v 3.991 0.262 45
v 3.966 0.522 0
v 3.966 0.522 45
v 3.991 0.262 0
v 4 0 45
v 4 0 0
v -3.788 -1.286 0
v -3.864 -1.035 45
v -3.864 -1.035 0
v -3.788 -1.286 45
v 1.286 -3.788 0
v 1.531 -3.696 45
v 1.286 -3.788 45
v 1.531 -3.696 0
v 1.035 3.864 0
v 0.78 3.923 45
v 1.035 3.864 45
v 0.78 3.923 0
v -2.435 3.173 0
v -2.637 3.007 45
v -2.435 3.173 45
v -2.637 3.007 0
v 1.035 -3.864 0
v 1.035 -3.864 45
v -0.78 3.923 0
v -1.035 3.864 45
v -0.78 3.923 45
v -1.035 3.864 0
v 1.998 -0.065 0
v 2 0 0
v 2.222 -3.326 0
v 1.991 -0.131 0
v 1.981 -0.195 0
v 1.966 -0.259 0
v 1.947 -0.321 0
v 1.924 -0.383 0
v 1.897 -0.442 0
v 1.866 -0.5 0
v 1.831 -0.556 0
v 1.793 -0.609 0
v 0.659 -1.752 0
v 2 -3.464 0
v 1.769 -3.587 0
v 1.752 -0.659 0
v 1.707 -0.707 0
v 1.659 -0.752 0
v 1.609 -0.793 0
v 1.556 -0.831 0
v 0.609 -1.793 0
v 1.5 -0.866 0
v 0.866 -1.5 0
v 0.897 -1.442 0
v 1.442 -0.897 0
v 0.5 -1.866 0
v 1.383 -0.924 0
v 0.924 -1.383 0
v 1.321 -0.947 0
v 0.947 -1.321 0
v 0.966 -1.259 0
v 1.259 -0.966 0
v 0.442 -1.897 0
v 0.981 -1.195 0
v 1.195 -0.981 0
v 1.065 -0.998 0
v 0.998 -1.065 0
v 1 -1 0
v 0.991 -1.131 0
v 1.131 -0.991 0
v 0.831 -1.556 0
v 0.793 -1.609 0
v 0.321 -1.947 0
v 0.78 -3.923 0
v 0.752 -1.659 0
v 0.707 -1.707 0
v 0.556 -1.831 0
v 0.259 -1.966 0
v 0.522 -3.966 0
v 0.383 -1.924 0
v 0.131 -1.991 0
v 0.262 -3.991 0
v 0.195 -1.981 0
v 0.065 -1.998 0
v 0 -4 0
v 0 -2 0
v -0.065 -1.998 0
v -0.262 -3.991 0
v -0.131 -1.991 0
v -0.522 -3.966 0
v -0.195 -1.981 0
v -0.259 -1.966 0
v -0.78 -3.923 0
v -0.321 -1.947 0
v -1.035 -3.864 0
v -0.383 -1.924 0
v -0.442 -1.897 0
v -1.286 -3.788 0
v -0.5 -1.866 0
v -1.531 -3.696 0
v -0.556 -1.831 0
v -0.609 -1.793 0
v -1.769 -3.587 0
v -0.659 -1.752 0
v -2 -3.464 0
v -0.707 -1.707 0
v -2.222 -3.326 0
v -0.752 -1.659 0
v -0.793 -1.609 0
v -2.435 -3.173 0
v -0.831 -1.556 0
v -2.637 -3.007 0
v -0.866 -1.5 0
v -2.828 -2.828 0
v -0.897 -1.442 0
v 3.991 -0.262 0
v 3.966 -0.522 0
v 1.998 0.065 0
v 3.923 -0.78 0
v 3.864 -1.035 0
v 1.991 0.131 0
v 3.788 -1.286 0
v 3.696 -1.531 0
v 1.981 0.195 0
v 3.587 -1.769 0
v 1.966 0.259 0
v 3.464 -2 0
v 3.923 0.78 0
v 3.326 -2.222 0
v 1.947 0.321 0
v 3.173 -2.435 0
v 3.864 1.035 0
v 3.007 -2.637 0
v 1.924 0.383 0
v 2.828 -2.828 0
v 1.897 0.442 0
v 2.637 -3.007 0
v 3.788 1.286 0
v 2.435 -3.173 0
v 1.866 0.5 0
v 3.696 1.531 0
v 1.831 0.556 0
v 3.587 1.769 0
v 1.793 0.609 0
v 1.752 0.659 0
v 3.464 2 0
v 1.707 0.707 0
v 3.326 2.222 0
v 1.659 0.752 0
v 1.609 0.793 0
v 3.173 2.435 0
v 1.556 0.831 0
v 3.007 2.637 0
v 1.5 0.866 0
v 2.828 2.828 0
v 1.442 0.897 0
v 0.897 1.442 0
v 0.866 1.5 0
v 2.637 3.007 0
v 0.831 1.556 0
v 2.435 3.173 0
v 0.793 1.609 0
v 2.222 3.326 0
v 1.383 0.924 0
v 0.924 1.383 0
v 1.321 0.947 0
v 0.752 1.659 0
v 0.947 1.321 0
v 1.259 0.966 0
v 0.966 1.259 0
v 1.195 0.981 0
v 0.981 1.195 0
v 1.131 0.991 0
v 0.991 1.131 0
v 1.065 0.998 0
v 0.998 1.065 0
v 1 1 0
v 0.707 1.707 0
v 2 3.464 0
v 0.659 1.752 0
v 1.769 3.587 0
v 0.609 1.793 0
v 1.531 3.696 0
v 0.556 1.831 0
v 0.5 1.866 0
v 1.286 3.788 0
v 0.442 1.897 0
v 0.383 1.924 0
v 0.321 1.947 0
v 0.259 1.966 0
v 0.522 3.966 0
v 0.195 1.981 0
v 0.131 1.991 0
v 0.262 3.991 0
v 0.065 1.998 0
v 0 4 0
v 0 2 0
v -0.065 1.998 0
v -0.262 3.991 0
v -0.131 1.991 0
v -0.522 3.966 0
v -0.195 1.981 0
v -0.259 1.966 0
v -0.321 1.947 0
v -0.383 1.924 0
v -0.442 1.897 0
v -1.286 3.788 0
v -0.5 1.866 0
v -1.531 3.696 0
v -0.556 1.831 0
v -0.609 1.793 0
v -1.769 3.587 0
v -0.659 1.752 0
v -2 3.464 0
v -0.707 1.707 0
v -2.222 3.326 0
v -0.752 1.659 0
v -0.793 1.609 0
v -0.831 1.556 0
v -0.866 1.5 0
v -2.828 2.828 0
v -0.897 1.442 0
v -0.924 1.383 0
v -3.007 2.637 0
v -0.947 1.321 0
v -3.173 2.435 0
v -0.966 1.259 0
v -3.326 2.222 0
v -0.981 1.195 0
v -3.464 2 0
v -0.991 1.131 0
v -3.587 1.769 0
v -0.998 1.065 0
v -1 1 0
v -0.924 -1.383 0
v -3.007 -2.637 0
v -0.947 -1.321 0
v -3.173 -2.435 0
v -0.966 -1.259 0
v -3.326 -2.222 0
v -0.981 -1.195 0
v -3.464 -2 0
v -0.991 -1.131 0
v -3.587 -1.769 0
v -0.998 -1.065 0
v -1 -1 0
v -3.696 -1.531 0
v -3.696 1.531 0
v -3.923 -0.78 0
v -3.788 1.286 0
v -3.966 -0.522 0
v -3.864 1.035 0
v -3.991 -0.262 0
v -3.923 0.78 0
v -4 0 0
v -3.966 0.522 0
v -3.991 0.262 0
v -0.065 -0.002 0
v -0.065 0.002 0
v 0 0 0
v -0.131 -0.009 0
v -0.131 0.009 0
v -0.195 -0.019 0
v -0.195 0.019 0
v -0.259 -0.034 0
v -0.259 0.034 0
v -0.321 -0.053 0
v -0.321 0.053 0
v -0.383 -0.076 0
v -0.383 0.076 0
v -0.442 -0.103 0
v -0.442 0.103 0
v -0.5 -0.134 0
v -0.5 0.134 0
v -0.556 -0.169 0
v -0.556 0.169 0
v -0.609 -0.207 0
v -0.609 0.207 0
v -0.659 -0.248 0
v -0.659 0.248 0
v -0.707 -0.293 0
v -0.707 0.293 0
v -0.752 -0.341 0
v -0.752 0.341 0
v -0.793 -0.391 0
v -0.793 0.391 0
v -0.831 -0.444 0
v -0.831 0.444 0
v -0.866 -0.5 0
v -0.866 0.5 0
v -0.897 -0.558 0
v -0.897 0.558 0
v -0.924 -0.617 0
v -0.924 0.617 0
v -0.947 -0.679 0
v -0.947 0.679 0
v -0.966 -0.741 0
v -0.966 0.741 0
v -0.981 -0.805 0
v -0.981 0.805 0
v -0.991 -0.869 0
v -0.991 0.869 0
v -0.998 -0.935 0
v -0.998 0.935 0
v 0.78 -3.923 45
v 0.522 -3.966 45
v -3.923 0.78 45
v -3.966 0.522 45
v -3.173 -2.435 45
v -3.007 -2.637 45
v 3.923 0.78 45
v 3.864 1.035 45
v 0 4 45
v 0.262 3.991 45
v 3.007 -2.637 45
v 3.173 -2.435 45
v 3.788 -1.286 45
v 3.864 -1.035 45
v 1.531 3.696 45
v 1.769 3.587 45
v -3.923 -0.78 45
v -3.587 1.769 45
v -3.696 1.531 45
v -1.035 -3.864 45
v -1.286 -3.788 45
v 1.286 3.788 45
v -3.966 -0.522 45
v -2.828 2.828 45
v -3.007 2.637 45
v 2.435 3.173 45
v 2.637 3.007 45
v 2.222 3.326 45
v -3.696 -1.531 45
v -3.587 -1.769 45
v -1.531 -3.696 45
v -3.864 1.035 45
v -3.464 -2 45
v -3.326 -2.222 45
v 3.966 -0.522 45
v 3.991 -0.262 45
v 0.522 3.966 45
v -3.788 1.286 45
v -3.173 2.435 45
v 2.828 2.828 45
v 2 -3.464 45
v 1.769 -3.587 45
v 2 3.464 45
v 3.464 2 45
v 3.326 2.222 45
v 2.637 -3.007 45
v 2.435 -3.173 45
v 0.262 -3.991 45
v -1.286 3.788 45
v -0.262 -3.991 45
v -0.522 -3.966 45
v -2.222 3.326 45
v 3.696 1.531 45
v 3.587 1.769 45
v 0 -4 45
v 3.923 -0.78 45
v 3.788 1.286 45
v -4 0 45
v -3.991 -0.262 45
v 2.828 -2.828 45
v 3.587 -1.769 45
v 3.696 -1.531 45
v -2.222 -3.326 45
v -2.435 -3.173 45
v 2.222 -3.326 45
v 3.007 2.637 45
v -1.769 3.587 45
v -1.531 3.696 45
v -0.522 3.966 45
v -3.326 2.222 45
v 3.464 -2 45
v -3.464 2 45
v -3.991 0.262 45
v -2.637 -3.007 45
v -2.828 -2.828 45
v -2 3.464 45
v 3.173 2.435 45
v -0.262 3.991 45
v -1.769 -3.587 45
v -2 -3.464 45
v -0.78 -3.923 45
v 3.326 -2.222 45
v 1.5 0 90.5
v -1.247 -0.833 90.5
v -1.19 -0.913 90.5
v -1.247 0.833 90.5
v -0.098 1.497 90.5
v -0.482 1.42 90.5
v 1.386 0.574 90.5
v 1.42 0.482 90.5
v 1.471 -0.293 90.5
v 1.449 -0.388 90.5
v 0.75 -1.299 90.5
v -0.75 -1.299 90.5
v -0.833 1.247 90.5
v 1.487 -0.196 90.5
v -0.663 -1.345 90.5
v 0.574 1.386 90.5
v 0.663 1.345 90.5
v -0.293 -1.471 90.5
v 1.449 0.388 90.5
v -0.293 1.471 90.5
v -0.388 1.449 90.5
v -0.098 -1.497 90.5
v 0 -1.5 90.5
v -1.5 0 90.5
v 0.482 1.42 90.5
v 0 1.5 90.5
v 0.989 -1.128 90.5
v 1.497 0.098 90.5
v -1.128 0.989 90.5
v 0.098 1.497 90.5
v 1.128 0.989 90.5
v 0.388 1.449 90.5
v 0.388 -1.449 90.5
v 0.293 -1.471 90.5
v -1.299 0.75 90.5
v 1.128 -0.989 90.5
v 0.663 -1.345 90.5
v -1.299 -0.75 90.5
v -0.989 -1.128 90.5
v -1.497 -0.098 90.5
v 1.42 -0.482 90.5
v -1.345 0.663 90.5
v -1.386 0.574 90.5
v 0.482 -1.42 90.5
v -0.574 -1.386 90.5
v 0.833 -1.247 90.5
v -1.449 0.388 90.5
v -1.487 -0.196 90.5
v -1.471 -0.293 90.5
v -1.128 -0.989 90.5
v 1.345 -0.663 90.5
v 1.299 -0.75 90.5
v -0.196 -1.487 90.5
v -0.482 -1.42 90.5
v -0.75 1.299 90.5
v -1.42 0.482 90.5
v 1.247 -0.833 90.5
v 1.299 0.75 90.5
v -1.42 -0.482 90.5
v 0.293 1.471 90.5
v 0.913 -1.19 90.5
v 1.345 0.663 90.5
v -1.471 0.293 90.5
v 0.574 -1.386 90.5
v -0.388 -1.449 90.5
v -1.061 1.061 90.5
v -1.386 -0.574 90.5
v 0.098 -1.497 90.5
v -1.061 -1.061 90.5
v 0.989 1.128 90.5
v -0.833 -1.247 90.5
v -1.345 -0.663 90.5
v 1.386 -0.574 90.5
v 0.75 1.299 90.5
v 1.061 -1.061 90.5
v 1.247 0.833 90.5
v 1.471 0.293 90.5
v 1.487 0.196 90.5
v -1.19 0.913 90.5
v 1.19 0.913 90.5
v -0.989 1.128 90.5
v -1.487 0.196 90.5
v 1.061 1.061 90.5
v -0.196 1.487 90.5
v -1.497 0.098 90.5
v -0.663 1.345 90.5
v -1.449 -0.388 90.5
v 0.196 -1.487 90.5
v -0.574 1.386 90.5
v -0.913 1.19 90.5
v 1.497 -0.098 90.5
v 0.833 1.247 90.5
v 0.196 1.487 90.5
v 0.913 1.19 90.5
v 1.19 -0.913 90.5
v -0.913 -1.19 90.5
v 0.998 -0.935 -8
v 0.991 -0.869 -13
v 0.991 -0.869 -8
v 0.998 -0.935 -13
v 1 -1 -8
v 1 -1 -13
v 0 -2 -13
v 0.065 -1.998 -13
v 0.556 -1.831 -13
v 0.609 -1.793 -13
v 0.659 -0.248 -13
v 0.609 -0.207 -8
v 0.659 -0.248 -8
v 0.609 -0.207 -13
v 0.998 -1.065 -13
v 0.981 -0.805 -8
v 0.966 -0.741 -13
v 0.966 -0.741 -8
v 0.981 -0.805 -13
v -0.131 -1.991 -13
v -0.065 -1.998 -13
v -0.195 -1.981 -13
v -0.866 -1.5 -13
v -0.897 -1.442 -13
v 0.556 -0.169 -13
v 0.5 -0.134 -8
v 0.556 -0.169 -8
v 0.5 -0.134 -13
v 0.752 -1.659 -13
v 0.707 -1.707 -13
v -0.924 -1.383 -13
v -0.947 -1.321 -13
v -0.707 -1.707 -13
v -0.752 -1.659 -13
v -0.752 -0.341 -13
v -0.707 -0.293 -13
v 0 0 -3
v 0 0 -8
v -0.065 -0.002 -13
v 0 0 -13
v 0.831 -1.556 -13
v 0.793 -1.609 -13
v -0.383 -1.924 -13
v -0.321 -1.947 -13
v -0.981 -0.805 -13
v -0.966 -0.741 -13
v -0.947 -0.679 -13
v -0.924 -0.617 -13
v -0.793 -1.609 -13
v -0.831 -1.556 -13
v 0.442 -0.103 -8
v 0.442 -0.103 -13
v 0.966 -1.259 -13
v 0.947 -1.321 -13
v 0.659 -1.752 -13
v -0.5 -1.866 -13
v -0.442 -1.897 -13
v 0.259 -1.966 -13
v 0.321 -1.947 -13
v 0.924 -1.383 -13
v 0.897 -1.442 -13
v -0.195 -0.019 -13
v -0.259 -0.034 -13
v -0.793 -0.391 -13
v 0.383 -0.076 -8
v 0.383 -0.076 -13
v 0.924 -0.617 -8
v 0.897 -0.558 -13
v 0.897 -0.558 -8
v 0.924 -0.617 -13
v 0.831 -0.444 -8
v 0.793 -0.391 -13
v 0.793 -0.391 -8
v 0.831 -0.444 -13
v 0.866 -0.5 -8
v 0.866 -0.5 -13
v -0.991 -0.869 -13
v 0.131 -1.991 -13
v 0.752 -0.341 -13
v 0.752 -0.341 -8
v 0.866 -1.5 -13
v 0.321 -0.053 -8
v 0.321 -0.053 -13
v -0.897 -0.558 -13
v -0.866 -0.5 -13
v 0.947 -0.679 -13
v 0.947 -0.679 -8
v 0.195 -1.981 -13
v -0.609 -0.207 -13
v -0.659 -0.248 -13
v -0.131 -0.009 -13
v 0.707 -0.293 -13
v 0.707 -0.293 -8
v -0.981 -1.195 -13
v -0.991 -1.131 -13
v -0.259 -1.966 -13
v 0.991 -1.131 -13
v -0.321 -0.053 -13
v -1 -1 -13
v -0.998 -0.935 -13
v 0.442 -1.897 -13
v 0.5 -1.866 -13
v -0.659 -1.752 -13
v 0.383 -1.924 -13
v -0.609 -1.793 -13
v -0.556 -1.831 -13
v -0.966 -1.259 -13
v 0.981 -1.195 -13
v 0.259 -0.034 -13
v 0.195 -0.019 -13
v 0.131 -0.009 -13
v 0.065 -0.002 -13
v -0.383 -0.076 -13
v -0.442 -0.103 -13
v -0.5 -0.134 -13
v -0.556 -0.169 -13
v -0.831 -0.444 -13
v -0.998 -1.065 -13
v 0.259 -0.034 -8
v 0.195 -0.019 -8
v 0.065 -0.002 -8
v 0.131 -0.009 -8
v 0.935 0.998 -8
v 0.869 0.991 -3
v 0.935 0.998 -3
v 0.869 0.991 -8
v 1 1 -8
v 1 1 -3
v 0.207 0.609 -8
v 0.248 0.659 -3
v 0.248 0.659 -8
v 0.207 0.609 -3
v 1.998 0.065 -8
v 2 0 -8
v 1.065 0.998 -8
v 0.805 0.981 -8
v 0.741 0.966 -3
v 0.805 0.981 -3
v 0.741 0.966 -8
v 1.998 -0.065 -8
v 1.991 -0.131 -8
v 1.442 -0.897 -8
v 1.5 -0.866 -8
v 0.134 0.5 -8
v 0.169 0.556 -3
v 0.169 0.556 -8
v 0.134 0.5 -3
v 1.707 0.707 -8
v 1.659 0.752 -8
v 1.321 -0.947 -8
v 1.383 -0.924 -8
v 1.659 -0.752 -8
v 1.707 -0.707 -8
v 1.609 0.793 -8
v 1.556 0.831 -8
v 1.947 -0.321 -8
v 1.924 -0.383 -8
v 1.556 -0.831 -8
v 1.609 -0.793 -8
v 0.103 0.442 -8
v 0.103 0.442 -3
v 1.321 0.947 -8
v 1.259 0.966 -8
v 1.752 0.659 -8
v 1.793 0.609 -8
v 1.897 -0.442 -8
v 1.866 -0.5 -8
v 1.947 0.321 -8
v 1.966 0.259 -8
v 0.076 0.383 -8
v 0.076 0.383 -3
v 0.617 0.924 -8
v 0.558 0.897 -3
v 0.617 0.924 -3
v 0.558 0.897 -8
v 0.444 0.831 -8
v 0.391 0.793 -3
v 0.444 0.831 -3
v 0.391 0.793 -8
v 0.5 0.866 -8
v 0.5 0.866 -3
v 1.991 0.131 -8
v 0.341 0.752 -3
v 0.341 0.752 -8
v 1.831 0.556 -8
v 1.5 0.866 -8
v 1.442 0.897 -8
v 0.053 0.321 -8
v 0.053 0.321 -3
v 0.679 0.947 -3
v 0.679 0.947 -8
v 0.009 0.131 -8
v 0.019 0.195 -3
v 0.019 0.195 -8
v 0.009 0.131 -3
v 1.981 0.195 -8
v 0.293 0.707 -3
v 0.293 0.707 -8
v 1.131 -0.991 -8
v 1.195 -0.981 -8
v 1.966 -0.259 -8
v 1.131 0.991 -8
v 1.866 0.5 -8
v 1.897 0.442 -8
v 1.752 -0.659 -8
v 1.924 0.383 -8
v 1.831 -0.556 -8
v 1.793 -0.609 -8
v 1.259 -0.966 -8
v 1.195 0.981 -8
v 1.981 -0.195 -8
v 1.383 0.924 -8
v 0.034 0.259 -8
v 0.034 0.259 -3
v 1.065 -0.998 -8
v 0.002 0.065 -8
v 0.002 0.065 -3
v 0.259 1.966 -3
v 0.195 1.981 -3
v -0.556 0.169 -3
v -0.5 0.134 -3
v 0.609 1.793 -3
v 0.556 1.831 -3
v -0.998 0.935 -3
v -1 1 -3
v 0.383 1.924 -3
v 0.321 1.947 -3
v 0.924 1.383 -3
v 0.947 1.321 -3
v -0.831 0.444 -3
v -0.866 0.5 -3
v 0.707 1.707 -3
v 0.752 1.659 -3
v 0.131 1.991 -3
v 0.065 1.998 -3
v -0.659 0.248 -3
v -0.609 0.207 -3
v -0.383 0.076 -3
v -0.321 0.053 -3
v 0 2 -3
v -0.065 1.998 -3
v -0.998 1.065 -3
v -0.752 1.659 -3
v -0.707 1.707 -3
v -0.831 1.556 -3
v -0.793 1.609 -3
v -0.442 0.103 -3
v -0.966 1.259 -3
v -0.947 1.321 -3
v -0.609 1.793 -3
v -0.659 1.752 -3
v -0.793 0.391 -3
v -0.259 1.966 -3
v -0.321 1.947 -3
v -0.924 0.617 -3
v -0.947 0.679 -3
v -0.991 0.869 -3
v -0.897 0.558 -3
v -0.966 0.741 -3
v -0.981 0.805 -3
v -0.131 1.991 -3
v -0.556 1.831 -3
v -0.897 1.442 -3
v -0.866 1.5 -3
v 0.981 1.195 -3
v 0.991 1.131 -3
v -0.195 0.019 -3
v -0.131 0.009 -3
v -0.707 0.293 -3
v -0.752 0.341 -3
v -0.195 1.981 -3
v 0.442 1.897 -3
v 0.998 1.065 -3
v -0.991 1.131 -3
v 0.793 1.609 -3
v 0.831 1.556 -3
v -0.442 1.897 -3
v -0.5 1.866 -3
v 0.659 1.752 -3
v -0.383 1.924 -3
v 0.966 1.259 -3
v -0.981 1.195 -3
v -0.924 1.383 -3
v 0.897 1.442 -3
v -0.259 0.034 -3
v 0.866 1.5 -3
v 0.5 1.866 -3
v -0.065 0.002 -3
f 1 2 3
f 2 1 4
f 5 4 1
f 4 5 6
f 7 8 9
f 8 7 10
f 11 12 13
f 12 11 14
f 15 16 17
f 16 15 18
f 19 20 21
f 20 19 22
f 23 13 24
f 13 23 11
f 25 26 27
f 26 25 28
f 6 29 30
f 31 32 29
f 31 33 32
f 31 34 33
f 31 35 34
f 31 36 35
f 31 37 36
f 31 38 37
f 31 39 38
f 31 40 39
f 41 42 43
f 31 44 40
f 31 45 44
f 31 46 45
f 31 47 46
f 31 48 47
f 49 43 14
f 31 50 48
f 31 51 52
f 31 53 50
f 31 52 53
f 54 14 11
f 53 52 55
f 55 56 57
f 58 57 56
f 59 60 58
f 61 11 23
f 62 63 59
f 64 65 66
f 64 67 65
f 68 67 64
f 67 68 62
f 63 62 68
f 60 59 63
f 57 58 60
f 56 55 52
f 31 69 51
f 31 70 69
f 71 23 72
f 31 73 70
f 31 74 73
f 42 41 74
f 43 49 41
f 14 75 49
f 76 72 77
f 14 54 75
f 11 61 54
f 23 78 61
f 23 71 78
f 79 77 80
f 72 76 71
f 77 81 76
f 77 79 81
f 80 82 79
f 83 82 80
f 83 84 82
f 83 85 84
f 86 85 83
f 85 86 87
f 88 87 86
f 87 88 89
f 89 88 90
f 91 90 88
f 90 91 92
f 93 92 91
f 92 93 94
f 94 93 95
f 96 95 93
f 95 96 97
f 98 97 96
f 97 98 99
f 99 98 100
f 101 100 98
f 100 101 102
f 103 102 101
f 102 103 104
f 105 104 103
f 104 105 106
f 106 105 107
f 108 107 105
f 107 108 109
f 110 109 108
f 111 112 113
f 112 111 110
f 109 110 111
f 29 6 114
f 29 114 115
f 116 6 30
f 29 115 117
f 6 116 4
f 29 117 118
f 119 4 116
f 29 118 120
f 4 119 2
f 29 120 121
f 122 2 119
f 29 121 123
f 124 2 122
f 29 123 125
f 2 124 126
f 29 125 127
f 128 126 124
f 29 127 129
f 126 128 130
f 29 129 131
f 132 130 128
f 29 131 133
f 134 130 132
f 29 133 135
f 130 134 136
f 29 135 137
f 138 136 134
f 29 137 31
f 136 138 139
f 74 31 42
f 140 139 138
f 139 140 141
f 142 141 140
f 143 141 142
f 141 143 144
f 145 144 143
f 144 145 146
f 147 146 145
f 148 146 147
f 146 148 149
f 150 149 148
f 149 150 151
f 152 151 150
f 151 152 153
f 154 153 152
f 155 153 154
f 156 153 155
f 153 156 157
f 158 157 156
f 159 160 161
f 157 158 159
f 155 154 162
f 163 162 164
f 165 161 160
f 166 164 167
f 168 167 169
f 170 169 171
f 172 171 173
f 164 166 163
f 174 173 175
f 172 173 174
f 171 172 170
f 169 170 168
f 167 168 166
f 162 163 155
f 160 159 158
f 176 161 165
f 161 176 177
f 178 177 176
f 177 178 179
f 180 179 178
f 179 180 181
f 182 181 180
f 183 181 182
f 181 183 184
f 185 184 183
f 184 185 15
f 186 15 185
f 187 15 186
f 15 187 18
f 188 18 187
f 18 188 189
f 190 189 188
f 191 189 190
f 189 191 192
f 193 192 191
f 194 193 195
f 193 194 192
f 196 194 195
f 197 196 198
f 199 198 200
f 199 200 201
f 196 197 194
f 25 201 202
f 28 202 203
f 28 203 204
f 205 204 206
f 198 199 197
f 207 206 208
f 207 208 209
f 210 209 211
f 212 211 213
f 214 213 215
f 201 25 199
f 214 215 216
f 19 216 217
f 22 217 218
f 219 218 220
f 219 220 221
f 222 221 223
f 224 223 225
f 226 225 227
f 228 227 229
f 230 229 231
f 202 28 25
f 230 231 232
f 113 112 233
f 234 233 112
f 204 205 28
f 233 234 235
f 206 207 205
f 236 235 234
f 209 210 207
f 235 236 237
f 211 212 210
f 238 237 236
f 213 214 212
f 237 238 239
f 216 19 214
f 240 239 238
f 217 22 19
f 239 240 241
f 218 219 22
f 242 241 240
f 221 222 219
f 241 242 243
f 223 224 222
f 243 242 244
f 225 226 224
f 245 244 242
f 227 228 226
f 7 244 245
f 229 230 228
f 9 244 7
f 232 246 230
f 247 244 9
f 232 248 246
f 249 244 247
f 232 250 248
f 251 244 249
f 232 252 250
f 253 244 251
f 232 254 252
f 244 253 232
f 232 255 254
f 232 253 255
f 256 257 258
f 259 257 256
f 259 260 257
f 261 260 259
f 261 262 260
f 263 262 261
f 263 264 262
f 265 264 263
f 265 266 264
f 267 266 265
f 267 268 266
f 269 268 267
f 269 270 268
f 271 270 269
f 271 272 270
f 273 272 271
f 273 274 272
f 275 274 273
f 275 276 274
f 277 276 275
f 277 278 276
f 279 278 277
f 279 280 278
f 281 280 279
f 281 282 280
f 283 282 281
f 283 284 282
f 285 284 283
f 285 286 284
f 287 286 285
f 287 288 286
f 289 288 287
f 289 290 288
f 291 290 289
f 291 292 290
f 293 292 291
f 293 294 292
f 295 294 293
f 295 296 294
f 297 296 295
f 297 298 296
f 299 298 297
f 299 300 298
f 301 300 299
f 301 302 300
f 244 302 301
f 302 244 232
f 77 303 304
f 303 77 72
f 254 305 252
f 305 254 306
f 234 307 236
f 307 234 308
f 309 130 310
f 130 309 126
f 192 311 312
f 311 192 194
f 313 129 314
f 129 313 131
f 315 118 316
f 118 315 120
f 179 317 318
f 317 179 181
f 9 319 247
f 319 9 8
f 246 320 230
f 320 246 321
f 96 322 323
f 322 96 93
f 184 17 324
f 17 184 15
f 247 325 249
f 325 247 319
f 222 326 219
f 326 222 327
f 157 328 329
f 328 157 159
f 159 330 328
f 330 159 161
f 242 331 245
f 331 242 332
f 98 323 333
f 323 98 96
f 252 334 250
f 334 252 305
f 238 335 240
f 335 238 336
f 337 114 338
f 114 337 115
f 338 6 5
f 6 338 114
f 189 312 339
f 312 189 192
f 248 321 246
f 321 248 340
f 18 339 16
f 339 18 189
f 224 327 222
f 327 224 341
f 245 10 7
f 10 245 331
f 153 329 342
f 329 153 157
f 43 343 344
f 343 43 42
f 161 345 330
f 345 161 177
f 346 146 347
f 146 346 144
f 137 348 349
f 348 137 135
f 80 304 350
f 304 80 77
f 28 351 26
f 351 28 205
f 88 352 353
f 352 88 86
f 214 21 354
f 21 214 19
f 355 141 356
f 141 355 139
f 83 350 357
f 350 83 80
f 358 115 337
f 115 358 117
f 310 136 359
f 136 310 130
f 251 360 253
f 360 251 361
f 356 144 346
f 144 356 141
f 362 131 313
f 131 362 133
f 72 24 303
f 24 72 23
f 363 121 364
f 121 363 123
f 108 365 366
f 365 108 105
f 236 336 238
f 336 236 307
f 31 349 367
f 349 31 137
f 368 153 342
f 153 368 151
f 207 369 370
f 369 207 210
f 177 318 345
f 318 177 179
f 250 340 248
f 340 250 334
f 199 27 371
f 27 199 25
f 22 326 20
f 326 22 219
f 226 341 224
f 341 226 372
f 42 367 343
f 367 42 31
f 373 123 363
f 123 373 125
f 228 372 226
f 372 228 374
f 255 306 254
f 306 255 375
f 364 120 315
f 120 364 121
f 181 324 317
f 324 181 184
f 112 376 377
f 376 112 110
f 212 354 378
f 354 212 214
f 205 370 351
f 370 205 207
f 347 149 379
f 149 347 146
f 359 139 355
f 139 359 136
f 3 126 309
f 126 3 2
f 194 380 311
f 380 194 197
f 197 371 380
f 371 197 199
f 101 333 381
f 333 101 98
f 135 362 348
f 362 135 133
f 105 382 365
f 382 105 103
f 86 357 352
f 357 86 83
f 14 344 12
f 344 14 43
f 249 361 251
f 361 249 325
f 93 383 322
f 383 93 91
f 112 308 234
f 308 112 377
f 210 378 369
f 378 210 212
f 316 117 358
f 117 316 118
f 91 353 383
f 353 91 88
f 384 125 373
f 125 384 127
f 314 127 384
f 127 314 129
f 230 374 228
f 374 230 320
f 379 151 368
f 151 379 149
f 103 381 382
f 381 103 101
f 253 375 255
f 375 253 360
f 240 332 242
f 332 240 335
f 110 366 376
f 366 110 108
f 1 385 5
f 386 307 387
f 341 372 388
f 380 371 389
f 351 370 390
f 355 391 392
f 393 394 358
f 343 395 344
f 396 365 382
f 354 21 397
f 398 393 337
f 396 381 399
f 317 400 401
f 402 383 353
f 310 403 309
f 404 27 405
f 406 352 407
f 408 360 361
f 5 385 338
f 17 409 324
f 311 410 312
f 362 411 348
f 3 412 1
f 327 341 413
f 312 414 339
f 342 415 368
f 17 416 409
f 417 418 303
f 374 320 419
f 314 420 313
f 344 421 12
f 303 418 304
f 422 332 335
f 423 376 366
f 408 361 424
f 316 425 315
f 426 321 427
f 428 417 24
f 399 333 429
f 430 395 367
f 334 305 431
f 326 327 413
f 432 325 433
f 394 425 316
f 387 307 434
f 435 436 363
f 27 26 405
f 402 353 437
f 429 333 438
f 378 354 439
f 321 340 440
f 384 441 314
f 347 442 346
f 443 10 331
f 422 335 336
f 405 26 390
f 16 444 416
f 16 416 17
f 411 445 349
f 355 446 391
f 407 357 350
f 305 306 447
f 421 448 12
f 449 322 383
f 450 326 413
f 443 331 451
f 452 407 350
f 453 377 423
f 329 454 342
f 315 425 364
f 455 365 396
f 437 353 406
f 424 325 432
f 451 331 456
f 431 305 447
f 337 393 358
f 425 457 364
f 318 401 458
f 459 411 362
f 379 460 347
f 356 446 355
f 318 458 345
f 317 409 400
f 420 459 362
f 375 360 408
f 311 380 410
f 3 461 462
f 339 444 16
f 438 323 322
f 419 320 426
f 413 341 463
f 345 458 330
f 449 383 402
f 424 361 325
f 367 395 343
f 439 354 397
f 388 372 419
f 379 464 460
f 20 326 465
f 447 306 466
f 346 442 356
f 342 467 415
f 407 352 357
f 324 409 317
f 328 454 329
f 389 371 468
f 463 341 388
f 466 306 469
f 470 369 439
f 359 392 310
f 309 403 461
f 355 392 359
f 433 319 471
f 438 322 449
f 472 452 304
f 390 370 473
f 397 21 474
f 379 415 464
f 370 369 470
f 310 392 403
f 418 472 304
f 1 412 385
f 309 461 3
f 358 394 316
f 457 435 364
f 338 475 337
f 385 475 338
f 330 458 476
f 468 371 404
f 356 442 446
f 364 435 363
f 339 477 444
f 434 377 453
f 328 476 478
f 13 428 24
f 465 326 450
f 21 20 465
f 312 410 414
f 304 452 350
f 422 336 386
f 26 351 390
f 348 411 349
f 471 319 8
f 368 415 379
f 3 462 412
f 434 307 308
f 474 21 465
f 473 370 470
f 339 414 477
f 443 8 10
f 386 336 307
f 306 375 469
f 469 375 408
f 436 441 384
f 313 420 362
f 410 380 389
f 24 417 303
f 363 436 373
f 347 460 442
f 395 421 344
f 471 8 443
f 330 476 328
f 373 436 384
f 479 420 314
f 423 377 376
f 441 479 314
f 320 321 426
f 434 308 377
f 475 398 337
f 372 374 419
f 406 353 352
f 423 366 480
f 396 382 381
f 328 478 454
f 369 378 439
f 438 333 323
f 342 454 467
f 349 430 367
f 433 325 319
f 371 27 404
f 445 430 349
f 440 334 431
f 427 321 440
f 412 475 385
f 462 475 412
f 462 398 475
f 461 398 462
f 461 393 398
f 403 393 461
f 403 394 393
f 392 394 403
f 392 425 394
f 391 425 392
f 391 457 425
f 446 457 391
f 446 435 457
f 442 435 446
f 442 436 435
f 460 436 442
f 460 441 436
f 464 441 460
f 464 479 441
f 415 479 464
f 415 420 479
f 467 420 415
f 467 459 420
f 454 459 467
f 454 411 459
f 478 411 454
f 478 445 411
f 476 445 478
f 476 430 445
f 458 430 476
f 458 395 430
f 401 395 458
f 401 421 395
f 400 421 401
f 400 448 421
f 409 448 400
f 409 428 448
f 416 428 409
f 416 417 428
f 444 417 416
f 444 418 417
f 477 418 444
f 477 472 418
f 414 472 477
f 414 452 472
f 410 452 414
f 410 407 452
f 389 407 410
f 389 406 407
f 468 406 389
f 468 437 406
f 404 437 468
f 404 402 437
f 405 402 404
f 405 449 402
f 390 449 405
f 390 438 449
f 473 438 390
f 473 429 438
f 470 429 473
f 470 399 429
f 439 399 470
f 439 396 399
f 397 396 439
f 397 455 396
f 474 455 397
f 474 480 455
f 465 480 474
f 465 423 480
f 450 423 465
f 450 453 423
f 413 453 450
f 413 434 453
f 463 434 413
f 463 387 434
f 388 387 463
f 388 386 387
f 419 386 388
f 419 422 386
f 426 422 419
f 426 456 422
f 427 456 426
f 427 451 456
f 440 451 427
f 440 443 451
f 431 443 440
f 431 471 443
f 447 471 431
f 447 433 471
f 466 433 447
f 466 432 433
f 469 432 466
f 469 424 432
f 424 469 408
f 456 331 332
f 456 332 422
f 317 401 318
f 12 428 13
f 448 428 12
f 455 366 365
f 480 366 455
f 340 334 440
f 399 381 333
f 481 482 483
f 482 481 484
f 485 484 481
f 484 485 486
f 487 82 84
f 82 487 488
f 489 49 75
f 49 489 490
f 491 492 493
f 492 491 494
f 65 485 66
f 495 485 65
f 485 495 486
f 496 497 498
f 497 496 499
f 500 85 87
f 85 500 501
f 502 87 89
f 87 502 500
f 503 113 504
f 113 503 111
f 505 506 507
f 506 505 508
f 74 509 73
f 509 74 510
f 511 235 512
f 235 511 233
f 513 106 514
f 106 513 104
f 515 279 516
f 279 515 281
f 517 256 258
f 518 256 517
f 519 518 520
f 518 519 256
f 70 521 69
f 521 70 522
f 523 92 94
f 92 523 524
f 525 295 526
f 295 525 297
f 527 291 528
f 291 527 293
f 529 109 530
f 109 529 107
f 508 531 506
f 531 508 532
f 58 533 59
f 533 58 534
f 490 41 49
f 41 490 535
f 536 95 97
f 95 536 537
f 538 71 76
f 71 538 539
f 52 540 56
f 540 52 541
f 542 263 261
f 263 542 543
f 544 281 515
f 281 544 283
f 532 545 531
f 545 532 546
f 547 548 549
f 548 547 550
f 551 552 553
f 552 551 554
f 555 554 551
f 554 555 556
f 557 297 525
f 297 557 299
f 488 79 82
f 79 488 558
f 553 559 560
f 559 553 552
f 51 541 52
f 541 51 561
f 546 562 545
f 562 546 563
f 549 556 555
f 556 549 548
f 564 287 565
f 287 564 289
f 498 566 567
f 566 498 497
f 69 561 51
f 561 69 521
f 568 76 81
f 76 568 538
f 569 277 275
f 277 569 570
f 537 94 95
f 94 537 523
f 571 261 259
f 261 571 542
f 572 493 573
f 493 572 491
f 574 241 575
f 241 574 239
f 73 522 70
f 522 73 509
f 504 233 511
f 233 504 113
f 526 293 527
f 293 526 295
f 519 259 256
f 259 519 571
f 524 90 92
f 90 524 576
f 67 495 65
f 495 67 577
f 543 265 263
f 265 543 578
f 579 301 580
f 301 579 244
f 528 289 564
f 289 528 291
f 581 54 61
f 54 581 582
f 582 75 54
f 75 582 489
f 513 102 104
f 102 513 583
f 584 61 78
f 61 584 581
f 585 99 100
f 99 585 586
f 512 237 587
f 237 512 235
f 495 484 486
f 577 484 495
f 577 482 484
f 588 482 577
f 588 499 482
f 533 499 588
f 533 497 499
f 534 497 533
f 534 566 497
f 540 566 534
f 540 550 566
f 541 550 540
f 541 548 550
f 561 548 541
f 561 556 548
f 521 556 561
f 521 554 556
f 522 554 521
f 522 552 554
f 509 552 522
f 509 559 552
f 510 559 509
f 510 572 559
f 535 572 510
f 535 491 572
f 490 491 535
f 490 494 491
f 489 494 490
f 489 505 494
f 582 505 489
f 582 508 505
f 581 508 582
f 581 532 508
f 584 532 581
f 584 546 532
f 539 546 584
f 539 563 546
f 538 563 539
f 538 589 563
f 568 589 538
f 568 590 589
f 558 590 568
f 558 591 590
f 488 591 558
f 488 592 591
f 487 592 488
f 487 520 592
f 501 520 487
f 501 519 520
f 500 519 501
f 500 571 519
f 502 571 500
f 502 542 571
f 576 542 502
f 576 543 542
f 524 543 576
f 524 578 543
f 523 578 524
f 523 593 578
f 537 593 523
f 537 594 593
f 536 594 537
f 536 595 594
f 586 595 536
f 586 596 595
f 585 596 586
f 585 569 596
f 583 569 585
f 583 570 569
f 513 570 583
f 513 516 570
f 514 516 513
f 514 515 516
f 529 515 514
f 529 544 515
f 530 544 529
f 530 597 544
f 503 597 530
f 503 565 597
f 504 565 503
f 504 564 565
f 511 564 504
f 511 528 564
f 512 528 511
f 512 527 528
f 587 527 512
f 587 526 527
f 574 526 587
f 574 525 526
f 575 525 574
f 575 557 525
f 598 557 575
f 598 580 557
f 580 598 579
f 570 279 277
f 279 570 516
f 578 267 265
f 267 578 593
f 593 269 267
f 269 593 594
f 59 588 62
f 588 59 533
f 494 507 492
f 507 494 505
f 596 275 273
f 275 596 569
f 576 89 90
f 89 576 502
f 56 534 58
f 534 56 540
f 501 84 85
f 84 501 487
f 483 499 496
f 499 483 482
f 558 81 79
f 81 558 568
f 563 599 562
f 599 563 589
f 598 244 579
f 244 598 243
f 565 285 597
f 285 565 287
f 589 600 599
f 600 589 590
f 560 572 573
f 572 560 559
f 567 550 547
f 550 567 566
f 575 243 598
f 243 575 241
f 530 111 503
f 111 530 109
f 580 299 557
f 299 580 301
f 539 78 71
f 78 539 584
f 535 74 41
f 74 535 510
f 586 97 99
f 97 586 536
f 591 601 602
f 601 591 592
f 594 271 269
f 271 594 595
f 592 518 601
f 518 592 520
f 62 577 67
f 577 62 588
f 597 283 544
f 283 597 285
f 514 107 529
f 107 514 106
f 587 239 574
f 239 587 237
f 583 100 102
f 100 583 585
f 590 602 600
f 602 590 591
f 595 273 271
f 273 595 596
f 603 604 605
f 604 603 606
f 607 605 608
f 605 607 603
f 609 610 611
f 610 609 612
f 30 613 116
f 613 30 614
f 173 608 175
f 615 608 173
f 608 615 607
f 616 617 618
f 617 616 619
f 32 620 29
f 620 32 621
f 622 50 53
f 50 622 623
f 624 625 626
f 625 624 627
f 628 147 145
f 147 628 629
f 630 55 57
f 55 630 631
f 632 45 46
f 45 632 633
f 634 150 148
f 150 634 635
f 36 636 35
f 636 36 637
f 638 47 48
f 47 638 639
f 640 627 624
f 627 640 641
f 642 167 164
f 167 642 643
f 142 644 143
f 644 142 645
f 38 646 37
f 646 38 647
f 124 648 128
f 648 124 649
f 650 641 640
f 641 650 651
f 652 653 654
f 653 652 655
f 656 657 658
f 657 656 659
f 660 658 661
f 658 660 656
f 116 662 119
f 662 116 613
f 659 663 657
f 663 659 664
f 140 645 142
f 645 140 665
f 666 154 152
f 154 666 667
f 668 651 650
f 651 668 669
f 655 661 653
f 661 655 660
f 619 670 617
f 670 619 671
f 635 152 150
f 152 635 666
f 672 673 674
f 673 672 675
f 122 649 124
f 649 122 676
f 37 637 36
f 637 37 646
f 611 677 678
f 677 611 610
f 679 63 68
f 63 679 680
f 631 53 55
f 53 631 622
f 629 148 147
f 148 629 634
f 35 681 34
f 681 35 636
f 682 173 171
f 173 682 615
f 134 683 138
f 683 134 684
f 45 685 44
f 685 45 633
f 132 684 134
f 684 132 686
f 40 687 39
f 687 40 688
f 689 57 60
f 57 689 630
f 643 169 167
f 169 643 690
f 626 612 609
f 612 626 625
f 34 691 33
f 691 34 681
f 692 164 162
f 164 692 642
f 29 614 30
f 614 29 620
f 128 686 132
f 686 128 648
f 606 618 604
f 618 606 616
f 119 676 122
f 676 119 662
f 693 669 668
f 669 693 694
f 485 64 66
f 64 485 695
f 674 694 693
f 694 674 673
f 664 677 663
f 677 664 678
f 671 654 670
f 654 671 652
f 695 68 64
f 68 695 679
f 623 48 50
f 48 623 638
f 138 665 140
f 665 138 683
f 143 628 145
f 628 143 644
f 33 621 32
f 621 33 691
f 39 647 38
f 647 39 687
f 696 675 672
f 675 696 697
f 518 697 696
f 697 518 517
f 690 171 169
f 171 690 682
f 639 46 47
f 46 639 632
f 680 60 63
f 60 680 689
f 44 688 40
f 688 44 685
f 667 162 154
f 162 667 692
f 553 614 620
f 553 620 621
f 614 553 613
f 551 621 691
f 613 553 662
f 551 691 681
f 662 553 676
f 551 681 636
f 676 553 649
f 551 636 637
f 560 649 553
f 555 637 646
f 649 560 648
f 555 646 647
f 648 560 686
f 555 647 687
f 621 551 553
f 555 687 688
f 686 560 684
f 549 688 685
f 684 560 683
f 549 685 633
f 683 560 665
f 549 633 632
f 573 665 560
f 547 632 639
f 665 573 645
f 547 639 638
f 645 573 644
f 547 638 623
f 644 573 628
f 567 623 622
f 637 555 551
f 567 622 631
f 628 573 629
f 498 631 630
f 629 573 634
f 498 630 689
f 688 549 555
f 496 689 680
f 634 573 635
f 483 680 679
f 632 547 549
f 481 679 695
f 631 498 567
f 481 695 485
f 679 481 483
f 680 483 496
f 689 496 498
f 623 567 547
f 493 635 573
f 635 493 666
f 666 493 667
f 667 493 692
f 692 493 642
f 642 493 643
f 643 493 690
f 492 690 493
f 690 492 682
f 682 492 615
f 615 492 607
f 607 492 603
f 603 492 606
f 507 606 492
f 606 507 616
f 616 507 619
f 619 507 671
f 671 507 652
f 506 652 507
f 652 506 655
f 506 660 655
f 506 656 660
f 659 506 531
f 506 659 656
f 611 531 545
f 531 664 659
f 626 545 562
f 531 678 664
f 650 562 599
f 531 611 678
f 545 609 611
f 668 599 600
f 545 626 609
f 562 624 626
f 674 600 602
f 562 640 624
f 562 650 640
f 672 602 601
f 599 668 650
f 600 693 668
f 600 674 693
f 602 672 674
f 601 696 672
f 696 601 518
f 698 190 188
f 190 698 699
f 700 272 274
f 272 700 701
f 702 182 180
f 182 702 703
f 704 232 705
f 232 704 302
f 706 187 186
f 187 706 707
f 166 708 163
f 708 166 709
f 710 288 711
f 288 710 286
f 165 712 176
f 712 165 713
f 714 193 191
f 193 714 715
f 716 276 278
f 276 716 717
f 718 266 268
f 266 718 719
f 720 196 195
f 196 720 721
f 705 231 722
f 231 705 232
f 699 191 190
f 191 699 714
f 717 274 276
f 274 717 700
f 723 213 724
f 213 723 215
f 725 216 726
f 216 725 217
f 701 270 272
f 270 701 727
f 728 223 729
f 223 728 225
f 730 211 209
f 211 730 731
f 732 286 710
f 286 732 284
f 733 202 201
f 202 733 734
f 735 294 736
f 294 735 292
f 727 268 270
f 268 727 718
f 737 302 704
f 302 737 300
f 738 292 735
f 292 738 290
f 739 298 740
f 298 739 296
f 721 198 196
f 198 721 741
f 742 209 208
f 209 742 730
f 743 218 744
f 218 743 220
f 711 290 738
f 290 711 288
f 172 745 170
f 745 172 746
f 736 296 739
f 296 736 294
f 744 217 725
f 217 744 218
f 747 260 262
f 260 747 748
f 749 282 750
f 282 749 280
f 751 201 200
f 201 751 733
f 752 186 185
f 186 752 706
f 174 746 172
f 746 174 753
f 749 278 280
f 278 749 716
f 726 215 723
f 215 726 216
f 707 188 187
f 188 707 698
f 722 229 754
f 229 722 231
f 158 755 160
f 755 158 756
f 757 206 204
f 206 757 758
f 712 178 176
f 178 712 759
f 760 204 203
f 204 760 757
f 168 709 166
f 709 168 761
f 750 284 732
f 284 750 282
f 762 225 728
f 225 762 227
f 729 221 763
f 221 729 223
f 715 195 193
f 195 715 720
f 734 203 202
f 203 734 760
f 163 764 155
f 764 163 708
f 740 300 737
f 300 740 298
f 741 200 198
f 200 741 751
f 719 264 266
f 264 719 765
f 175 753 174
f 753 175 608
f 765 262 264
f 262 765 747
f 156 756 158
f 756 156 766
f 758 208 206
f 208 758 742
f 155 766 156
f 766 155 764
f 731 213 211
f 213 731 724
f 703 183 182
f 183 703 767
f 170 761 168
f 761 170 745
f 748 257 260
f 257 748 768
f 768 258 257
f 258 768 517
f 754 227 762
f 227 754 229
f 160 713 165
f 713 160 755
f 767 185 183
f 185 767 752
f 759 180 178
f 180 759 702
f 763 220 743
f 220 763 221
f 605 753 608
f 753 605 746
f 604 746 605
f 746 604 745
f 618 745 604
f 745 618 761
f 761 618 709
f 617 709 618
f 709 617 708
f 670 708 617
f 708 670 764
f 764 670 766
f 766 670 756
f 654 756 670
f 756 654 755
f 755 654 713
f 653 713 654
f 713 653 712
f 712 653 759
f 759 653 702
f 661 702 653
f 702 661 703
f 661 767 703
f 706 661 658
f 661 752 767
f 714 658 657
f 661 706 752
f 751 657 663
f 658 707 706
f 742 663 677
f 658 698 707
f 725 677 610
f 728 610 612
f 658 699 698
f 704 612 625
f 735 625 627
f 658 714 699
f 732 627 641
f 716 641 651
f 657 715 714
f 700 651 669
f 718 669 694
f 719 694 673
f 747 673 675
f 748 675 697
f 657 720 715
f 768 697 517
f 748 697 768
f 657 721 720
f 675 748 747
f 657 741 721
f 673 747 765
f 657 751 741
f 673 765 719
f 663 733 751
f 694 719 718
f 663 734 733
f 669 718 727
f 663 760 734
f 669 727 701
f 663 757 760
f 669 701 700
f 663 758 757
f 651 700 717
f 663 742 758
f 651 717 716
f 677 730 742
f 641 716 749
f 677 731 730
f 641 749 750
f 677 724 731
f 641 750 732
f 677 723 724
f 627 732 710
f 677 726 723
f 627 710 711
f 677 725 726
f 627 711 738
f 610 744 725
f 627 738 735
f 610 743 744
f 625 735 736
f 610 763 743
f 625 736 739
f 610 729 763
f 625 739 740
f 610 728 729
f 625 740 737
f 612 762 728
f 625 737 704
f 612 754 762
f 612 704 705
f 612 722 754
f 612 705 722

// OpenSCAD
// Tissue-grinding pestle for 1.5 mL microcentrifuge tube
// Print orientation: standing upright on the bed (z = 0), building +Z.

// ---------------- Parameters ----------------
handle_d      = 8;    // handle diameter (mm), z = 0 .. 45
handle_h      = 45;   // handle height (mm)
cone_d_bottom = 8;    // cone diameter at its bottom (mm), z = 45
cone_d_top    = 3;    // cone diameter at its top (mm), z = 62
tip_r         = 1.5;  // tip sphere radius (mm), centre at z = 62
groove_count  = 4;    // number of circumferential grooves
groove_w      = 2;    // groove width along Z (mm)
groove_d      = 1;    // groove depth (mm)
groove_z      = [10, 15, 20, 25]; // groove centre heights (mm)
eps           = 0.5;  // cutter overshoot past faces (mm)

$fn = 96;

// ---------------- Model ----------------
union() {
    // (1) Cylindrical handle
    translate([0, 0, 0])
        cylinder(d = handle_d, h = handle_h);

    // (2) Tapering cone: 8 mm at z = 45 down to 3 mm at z = 62
    translate([0, 0, handle_h])
        cylinder(d1 = cone_d_bottom, d2 = cone_d_top, h = handle_h + eps);

    // (3) Rounded tip: 3 mm diameter sphere centred at z = 62
    translate([0, 0, tip_r])
        sphere(r = tip_r);
}

// ---------------- Grooves ----------------
for (g = [0 : groove_count - 1]) {
    a = g * 360 / groove_count;   // groove angle
    translate([0, 0, groove_z[g]])
        rotate([0, 0, a])
            translate([0, -groove_d, 0])
                cylinder(d = groove_w, h = handle_h + 2 * eps, center = true);
}
